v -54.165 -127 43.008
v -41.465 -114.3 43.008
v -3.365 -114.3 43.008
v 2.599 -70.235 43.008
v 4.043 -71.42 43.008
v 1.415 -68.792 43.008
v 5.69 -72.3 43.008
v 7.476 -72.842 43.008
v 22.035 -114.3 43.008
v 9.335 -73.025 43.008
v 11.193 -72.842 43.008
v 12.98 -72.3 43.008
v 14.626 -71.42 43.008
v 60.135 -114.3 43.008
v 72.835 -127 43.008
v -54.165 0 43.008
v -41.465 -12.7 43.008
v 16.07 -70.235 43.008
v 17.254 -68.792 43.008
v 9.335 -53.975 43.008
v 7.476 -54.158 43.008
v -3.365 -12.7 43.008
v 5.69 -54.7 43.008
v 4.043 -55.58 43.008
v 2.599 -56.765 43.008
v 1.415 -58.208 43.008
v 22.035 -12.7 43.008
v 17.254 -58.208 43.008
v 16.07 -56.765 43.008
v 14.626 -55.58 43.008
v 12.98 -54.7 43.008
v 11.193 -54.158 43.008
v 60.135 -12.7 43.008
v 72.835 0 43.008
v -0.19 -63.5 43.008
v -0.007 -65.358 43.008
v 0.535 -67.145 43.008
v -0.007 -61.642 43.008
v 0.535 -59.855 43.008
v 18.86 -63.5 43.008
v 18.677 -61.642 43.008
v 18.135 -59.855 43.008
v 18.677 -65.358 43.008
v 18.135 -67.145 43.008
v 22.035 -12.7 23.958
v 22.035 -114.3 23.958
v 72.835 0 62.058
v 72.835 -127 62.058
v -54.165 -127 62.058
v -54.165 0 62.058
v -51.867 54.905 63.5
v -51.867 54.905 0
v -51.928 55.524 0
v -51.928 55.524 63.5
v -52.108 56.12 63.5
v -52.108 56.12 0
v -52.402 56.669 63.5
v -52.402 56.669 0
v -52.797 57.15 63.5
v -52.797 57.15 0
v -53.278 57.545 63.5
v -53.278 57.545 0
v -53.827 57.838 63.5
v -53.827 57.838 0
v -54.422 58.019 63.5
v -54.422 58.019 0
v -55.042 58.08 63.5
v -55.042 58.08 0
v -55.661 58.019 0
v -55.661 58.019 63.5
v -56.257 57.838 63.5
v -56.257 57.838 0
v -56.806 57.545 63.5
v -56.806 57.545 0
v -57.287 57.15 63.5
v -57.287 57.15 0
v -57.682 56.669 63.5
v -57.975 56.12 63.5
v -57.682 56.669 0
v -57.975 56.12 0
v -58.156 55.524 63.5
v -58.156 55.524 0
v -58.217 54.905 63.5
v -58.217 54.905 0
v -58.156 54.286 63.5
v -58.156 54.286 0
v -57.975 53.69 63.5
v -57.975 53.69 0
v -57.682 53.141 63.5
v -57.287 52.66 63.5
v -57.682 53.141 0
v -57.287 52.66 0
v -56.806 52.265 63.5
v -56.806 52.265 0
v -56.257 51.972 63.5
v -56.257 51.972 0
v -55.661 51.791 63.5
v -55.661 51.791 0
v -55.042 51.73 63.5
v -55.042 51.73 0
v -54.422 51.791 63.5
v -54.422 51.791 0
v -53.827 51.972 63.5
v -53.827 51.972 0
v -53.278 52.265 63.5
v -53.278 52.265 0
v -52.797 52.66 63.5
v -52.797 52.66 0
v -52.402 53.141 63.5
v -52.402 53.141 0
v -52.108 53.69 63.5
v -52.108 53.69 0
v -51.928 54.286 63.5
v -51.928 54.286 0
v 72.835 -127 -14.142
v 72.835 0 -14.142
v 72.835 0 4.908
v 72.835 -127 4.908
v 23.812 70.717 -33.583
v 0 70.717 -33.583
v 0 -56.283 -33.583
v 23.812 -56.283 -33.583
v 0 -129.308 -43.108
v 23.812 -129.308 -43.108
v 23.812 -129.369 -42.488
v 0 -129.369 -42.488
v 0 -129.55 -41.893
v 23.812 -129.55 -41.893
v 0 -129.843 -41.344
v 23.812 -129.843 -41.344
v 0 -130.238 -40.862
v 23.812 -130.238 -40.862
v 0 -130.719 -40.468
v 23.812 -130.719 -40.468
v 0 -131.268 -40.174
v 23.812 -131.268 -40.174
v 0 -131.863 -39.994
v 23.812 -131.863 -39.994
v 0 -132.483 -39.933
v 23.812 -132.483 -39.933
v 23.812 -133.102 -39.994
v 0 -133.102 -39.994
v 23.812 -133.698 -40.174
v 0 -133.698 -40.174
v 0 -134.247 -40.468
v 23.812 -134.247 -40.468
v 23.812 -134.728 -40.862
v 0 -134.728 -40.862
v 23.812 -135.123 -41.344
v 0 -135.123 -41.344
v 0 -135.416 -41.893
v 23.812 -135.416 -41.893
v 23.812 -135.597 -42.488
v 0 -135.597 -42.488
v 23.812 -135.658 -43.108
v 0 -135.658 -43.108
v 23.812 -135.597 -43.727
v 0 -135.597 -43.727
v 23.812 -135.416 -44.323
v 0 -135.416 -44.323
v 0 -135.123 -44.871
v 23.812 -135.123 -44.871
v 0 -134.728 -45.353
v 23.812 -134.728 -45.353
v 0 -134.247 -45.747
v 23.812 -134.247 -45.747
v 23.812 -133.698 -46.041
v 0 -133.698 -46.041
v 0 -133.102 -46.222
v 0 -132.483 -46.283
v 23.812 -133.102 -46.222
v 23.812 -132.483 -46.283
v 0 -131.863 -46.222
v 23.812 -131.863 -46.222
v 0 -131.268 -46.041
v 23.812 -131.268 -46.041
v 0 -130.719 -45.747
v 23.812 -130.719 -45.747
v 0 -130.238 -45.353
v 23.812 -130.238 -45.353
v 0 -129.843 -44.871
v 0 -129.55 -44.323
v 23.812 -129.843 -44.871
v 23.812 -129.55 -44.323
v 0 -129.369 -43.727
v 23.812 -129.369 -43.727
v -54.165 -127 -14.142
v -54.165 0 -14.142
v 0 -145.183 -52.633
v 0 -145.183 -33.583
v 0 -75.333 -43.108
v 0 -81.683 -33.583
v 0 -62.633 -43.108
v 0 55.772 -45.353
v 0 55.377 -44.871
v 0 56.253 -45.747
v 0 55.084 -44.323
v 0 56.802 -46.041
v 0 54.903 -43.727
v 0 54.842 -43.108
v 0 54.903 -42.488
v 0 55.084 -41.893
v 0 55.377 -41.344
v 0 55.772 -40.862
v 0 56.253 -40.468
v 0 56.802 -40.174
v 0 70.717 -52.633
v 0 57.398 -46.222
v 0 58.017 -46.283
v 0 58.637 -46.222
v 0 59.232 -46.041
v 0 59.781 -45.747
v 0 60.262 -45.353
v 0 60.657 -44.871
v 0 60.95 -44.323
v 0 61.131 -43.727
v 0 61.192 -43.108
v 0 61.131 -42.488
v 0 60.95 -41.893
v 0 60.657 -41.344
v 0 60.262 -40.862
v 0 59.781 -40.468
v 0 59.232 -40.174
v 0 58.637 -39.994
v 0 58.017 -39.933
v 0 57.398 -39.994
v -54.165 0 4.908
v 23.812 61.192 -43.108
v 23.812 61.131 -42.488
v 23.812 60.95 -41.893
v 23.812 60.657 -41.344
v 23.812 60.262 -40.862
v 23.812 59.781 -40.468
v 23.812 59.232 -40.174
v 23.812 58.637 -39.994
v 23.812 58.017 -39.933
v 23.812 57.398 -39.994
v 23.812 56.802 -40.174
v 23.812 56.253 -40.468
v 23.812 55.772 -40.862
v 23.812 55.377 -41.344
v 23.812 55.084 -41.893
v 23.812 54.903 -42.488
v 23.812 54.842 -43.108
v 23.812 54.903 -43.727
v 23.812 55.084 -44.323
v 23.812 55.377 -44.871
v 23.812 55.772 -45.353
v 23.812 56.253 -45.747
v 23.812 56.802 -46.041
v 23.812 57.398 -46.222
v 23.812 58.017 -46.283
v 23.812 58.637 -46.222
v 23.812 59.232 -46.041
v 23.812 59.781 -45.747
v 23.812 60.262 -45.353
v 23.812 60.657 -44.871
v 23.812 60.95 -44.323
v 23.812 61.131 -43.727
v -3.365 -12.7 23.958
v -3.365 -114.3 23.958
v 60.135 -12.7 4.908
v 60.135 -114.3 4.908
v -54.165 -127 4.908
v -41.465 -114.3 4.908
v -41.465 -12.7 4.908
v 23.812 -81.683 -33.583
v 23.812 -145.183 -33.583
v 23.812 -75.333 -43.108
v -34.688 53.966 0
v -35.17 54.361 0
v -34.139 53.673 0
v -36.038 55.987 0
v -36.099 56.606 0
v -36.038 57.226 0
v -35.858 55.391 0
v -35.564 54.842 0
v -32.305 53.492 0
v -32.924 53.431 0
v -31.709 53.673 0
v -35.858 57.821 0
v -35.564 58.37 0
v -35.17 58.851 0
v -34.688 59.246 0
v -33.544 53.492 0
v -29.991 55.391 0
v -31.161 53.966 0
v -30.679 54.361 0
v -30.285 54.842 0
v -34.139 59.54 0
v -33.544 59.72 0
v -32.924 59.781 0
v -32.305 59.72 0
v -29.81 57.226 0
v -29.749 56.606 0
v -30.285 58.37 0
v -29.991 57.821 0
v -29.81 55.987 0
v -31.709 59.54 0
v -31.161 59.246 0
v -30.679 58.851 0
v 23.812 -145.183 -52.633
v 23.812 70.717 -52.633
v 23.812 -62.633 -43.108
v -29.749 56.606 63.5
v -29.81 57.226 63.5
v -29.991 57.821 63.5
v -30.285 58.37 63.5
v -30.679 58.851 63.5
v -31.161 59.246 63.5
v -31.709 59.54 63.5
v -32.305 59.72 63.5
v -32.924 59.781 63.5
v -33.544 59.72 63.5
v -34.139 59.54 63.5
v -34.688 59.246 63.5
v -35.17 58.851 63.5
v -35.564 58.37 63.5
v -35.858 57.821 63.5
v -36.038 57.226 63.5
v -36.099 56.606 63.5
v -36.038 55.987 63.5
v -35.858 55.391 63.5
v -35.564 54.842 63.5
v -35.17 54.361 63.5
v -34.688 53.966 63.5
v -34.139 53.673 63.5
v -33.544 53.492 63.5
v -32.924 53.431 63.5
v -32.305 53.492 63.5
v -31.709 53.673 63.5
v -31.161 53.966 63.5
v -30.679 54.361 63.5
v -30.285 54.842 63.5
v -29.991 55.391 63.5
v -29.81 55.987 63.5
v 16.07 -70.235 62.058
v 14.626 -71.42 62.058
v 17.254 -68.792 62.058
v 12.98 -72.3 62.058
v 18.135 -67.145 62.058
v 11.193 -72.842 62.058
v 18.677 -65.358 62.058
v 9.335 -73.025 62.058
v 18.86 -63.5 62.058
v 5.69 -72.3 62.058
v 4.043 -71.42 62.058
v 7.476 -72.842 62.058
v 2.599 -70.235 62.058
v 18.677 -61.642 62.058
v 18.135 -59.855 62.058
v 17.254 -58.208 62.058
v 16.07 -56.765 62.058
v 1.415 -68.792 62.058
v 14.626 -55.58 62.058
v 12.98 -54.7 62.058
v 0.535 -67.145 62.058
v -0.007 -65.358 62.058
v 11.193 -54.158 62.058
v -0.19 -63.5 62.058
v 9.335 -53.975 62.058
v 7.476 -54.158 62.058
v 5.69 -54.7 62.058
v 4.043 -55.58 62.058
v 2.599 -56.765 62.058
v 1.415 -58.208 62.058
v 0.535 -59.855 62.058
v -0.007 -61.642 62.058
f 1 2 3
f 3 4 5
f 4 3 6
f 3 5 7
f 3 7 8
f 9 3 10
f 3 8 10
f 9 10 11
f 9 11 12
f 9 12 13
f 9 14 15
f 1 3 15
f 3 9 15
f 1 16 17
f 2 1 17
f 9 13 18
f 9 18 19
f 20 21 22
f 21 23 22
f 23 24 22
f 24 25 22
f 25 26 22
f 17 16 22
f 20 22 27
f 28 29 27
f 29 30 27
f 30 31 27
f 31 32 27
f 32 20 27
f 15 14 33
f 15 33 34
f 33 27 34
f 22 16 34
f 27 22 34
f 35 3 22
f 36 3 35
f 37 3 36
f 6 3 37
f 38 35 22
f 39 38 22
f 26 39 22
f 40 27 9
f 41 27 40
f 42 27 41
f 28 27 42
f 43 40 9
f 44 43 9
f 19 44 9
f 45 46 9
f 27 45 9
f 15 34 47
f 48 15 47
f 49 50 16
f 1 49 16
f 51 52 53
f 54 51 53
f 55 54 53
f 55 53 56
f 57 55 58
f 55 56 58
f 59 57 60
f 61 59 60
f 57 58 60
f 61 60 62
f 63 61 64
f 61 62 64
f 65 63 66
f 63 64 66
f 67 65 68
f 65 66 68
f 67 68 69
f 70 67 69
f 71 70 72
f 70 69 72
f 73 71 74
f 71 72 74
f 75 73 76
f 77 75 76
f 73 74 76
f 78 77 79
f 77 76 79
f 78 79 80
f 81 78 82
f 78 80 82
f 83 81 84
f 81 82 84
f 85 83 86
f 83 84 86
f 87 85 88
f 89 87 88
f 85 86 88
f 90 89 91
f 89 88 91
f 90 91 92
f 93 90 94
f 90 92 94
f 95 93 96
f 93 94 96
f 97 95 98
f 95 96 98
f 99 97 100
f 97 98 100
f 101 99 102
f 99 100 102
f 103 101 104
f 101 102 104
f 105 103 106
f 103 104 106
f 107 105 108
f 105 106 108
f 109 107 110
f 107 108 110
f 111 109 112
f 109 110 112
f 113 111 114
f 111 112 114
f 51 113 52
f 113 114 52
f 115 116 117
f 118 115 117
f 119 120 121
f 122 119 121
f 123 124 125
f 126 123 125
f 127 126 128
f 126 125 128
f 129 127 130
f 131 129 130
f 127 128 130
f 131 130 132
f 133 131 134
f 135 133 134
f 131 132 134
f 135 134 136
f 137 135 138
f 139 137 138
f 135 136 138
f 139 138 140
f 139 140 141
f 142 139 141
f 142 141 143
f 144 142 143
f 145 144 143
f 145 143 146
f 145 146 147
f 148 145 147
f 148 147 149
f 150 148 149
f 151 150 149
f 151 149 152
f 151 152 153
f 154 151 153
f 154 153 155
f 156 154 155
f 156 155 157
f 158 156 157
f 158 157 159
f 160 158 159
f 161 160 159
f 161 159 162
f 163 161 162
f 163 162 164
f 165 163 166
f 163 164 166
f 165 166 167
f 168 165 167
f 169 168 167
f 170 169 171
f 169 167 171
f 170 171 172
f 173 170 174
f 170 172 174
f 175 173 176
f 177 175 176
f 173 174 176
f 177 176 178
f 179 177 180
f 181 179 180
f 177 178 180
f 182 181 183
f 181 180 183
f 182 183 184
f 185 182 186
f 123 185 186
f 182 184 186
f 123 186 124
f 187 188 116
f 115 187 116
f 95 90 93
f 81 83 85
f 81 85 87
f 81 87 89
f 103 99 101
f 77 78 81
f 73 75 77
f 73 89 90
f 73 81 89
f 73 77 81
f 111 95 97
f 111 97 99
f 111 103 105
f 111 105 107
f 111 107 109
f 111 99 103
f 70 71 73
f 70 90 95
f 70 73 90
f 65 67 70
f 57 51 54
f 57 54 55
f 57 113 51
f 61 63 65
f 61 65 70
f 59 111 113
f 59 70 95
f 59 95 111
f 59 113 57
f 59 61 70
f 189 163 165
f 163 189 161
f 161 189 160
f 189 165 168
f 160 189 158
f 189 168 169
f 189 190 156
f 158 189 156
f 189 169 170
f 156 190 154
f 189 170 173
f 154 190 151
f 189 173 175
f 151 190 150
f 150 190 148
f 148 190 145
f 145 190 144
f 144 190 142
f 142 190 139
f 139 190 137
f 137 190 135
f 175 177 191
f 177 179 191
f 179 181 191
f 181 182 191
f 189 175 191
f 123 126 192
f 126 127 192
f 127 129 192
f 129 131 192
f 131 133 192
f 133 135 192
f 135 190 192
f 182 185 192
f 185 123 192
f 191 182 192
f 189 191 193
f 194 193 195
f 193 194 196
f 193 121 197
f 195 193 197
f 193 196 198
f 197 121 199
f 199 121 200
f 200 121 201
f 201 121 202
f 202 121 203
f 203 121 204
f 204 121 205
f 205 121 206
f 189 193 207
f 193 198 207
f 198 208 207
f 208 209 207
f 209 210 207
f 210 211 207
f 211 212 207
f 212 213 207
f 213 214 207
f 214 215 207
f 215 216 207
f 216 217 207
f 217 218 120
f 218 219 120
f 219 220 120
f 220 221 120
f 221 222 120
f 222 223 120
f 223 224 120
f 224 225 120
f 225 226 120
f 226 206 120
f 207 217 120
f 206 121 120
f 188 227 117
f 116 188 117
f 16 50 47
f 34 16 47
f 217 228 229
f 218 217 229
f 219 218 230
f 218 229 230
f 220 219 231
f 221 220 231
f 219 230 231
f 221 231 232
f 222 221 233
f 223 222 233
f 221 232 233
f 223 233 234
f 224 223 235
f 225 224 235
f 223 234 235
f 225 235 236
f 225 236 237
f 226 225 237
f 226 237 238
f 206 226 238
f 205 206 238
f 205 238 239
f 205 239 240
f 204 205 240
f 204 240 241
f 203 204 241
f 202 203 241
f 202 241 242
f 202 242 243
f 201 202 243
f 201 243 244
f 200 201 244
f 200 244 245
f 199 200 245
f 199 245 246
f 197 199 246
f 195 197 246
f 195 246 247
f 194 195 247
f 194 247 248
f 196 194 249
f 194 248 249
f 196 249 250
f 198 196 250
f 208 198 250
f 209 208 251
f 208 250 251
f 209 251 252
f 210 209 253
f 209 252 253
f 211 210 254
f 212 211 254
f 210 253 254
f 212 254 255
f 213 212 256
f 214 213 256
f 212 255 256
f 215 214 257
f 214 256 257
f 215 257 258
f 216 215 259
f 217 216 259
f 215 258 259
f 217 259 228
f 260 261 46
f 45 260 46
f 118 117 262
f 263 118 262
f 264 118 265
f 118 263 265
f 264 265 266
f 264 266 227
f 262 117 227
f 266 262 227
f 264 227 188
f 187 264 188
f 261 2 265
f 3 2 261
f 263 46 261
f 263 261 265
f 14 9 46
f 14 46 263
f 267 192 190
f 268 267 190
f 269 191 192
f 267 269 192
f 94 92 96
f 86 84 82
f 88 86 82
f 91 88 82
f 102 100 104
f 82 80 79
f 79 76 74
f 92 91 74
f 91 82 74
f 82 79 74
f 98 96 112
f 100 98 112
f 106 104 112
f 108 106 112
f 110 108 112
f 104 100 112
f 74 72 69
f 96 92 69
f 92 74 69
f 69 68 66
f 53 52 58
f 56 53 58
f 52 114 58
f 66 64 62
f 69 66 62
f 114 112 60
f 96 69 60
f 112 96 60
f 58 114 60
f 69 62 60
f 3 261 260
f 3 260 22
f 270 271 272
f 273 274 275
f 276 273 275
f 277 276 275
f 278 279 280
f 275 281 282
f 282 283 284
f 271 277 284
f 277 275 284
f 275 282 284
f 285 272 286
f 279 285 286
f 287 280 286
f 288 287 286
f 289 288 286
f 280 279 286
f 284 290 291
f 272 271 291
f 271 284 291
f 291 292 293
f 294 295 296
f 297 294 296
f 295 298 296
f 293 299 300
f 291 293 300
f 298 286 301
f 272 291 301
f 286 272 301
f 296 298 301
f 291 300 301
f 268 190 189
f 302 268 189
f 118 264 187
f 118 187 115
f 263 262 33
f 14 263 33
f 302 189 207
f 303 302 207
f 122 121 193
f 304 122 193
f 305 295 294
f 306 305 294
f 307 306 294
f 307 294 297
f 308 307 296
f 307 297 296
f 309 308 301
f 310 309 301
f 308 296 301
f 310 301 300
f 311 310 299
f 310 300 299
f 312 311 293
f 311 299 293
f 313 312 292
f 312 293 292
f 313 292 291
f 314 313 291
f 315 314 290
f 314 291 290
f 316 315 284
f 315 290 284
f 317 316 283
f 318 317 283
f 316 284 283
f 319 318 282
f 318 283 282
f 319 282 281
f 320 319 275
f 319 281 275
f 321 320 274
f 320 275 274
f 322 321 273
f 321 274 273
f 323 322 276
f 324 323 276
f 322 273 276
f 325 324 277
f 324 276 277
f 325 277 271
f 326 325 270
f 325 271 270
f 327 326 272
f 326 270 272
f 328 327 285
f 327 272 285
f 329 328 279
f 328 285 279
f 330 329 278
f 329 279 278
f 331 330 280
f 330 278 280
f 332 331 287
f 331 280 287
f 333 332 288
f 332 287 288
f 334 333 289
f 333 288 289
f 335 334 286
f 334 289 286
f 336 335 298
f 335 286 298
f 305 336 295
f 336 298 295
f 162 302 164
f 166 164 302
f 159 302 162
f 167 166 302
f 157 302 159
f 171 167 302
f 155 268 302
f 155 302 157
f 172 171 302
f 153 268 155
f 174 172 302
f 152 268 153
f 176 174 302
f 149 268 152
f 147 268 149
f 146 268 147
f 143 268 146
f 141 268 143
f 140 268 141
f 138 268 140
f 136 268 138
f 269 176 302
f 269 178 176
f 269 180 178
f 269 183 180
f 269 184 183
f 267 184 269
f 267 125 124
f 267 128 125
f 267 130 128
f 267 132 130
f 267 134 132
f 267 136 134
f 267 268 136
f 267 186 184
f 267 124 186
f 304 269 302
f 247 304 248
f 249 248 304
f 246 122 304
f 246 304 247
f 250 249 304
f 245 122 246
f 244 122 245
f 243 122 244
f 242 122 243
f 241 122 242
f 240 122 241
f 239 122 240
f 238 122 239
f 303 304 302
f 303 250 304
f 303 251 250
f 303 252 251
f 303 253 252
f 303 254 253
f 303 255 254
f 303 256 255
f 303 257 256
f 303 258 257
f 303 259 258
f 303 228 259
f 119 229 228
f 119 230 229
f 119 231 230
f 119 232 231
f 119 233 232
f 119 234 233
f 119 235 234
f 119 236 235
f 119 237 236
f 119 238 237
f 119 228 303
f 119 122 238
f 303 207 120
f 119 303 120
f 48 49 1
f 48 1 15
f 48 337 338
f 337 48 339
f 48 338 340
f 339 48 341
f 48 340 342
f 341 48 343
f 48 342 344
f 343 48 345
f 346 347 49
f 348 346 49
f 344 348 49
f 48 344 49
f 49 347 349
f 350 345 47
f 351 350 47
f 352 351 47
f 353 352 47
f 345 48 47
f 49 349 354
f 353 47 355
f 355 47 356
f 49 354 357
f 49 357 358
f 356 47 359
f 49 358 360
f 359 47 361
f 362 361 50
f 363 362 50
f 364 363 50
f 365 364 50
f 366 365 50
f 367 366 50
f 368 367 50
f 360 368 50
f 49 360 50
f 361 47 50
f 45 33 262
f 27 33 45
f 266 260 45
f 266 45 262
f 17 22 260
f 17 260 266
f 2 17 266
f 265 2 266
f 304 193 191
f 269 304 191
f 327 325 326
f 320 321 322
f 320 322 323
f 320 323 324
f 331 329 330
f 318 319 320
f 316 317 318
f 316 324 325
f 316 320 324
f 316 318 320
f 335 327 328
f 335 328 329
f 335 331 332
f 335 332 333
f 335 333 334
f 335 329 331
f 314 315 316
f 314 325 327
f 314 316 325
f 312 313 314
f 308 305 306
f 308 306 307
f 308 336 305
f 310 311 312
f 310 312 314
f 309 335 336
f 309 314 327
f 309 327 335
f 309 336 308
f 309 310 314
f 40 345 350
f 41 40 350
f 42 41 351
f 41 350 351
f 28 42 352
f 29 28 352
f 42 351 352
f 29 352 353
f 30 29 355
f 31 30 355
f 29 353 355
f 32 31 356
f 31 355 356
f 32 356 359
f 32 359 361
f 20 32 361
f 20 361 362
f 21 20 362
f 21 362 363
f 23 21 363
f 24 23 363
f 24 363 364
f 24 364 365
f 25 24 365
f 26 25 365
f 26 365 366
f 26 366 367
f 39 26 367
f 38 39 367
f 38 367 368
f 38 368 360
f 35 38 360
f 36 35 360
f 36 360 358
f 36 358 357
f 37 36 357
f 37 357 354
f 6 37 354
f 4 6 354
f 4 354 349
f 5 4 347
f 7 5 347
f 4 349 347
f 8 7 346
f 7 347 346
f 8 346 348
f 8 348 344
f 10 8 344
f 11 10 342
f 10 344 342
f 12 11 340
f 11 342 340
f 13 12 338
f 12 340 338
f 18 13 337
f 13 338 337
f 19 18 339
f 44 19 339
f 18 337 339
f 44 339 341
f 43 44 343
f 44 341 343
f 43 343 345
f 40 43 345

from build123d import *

# Parameters (mm, degrees)
F1_DEPTH  = 127
F2_W      = 101.6
F2_H      = 38.1
F3_DEPTH  = 12.7
F4_W      = 101.6
F4_H      = 38.1
F5_DEPTH  = 12.7
F6_W      = 25.4
F6_H      = 19.05
F7_DEPTH  = 101.6
F8_R      = 9.525
F9_DEPTH  = 25.4
F11_DEPTH = 23.8125
F12_R     = 3.175
F13_DEPTH = 63.5
F14_R     = 3.175
F15_DEPTH = 25.4


with BuildPart() as f1:
    # F0 (on Front) → F1 (new body)
    with BuildSketch(Plane.XZ):
        Polygon((72.8346217871, 62.0580464602), (-54.1653782129, 62.0580464602), (-54.1653782129, 43.0080464602), (-41.4653782129, 43.0080464602), (-41.4653782129, 4.9080464602), (-54.1653782129, 4.9080464602), (-54.1653782129, -14.1419535398), (72.8346217871, -14.1419535398), (72.8346217871, 4.9080464602), (60.1346217871, 4.9080464602), (60.1346217871, 43.0080464602), (72.8346217871, 43.0080464602), align=None)
    extrude(amount=F1_DEPTH)

    # F2 (on face) → F3 (cut)
    with BuildSketch(Plane.XZ.offset(127)):
        with Locations((9.3346217871, 23.9580464602)):
            Rectangle(F2_W, F2_H)
    extrude(amount=-F3_DEPTH, mode=Mode.SUBTRACT)

    # F4 (on face) → F5 (cut)
    with BuildSketch(Plane(origin=(0, 0, 0), x_dir=(-1, 0, 0), z_dir=(0, 1, 0))):
        with Locations((-9.3346217871, 23.9580464602)):
            Rectangle(F4_W, F4_H)
    extrude(amount=-F5_DEPTH, mode=Mode.SUBTRACT)

    # F6 (on face) → F7 (cut)
    with BuildSketch(Plane.XZ.offset(114.3)):
        with Locations((9.3346217871, 33.4830464602)):
            Rectangle(F6_W, F6_H)
    extrude(amount=-F7_DEPTH, mode=Mode.SUBTRACT)

    # F8 (on face) → F9 (cut)
    with BuildSketch(Plane.XY.offset(62.0580464602)):
        with Locations((9.3346217871, -63.5)):
            Circle(F8_R)
    extrude(amount=-F9_DEPTH, mode=Mode.SUBTRACT)


with BuildPart() as f11:
    # F10 (on Right) → F11 (new body)
    with BuildSketch(Plane.YZ):
        Polygon((70.7171371222, -52.632534641), (70.7171371222, -33.582534641), (-56.2828628778, -33.582534641), (-62.6328628778, -43.107534641), (-75.3328628778, -43.107534641), (-81.6828628778, -33.582534641), (-145.1828628778, -33.582534641), (-145.1828628778, -52.632534641), align=None)
    extrude(amount=F11_DEPTH)

    # F14 (on face) → F15 (cut)
    with BuildSketch(Plane.YZ.offset(23.8125)):
        with Locations((-132.4828628778, -43.107534641)):
            Circle(F14_R)
        with Locations((58.0171371222, -43.107534641)):
            Circle(F14_R)
    extrude(amount=-F15_DEPTH, mode=Mode.SUBTRACT)


with BuildPart() as f13:
    # F12 (on Top) → F13 (new body)
    with BuildSketch(Plane.XY):
        with Locations((-55.041719228, 54.9050159752)):
            Circle(F12_R)
    extrude(amount=F13_DEPTH)


with BuildPart() as f13b:
    # F12 (on Top) → F13, piece 2 (new body)
    with BuildSketch(Plane.XY):
        with Locations((-32.9244509339, 56.6063374281)):
            Circle(F12_R)
    extrude(amount=F13_DEPTH)


solid = Compound([f1.part, f11.part, f13.part, f13b.part])
